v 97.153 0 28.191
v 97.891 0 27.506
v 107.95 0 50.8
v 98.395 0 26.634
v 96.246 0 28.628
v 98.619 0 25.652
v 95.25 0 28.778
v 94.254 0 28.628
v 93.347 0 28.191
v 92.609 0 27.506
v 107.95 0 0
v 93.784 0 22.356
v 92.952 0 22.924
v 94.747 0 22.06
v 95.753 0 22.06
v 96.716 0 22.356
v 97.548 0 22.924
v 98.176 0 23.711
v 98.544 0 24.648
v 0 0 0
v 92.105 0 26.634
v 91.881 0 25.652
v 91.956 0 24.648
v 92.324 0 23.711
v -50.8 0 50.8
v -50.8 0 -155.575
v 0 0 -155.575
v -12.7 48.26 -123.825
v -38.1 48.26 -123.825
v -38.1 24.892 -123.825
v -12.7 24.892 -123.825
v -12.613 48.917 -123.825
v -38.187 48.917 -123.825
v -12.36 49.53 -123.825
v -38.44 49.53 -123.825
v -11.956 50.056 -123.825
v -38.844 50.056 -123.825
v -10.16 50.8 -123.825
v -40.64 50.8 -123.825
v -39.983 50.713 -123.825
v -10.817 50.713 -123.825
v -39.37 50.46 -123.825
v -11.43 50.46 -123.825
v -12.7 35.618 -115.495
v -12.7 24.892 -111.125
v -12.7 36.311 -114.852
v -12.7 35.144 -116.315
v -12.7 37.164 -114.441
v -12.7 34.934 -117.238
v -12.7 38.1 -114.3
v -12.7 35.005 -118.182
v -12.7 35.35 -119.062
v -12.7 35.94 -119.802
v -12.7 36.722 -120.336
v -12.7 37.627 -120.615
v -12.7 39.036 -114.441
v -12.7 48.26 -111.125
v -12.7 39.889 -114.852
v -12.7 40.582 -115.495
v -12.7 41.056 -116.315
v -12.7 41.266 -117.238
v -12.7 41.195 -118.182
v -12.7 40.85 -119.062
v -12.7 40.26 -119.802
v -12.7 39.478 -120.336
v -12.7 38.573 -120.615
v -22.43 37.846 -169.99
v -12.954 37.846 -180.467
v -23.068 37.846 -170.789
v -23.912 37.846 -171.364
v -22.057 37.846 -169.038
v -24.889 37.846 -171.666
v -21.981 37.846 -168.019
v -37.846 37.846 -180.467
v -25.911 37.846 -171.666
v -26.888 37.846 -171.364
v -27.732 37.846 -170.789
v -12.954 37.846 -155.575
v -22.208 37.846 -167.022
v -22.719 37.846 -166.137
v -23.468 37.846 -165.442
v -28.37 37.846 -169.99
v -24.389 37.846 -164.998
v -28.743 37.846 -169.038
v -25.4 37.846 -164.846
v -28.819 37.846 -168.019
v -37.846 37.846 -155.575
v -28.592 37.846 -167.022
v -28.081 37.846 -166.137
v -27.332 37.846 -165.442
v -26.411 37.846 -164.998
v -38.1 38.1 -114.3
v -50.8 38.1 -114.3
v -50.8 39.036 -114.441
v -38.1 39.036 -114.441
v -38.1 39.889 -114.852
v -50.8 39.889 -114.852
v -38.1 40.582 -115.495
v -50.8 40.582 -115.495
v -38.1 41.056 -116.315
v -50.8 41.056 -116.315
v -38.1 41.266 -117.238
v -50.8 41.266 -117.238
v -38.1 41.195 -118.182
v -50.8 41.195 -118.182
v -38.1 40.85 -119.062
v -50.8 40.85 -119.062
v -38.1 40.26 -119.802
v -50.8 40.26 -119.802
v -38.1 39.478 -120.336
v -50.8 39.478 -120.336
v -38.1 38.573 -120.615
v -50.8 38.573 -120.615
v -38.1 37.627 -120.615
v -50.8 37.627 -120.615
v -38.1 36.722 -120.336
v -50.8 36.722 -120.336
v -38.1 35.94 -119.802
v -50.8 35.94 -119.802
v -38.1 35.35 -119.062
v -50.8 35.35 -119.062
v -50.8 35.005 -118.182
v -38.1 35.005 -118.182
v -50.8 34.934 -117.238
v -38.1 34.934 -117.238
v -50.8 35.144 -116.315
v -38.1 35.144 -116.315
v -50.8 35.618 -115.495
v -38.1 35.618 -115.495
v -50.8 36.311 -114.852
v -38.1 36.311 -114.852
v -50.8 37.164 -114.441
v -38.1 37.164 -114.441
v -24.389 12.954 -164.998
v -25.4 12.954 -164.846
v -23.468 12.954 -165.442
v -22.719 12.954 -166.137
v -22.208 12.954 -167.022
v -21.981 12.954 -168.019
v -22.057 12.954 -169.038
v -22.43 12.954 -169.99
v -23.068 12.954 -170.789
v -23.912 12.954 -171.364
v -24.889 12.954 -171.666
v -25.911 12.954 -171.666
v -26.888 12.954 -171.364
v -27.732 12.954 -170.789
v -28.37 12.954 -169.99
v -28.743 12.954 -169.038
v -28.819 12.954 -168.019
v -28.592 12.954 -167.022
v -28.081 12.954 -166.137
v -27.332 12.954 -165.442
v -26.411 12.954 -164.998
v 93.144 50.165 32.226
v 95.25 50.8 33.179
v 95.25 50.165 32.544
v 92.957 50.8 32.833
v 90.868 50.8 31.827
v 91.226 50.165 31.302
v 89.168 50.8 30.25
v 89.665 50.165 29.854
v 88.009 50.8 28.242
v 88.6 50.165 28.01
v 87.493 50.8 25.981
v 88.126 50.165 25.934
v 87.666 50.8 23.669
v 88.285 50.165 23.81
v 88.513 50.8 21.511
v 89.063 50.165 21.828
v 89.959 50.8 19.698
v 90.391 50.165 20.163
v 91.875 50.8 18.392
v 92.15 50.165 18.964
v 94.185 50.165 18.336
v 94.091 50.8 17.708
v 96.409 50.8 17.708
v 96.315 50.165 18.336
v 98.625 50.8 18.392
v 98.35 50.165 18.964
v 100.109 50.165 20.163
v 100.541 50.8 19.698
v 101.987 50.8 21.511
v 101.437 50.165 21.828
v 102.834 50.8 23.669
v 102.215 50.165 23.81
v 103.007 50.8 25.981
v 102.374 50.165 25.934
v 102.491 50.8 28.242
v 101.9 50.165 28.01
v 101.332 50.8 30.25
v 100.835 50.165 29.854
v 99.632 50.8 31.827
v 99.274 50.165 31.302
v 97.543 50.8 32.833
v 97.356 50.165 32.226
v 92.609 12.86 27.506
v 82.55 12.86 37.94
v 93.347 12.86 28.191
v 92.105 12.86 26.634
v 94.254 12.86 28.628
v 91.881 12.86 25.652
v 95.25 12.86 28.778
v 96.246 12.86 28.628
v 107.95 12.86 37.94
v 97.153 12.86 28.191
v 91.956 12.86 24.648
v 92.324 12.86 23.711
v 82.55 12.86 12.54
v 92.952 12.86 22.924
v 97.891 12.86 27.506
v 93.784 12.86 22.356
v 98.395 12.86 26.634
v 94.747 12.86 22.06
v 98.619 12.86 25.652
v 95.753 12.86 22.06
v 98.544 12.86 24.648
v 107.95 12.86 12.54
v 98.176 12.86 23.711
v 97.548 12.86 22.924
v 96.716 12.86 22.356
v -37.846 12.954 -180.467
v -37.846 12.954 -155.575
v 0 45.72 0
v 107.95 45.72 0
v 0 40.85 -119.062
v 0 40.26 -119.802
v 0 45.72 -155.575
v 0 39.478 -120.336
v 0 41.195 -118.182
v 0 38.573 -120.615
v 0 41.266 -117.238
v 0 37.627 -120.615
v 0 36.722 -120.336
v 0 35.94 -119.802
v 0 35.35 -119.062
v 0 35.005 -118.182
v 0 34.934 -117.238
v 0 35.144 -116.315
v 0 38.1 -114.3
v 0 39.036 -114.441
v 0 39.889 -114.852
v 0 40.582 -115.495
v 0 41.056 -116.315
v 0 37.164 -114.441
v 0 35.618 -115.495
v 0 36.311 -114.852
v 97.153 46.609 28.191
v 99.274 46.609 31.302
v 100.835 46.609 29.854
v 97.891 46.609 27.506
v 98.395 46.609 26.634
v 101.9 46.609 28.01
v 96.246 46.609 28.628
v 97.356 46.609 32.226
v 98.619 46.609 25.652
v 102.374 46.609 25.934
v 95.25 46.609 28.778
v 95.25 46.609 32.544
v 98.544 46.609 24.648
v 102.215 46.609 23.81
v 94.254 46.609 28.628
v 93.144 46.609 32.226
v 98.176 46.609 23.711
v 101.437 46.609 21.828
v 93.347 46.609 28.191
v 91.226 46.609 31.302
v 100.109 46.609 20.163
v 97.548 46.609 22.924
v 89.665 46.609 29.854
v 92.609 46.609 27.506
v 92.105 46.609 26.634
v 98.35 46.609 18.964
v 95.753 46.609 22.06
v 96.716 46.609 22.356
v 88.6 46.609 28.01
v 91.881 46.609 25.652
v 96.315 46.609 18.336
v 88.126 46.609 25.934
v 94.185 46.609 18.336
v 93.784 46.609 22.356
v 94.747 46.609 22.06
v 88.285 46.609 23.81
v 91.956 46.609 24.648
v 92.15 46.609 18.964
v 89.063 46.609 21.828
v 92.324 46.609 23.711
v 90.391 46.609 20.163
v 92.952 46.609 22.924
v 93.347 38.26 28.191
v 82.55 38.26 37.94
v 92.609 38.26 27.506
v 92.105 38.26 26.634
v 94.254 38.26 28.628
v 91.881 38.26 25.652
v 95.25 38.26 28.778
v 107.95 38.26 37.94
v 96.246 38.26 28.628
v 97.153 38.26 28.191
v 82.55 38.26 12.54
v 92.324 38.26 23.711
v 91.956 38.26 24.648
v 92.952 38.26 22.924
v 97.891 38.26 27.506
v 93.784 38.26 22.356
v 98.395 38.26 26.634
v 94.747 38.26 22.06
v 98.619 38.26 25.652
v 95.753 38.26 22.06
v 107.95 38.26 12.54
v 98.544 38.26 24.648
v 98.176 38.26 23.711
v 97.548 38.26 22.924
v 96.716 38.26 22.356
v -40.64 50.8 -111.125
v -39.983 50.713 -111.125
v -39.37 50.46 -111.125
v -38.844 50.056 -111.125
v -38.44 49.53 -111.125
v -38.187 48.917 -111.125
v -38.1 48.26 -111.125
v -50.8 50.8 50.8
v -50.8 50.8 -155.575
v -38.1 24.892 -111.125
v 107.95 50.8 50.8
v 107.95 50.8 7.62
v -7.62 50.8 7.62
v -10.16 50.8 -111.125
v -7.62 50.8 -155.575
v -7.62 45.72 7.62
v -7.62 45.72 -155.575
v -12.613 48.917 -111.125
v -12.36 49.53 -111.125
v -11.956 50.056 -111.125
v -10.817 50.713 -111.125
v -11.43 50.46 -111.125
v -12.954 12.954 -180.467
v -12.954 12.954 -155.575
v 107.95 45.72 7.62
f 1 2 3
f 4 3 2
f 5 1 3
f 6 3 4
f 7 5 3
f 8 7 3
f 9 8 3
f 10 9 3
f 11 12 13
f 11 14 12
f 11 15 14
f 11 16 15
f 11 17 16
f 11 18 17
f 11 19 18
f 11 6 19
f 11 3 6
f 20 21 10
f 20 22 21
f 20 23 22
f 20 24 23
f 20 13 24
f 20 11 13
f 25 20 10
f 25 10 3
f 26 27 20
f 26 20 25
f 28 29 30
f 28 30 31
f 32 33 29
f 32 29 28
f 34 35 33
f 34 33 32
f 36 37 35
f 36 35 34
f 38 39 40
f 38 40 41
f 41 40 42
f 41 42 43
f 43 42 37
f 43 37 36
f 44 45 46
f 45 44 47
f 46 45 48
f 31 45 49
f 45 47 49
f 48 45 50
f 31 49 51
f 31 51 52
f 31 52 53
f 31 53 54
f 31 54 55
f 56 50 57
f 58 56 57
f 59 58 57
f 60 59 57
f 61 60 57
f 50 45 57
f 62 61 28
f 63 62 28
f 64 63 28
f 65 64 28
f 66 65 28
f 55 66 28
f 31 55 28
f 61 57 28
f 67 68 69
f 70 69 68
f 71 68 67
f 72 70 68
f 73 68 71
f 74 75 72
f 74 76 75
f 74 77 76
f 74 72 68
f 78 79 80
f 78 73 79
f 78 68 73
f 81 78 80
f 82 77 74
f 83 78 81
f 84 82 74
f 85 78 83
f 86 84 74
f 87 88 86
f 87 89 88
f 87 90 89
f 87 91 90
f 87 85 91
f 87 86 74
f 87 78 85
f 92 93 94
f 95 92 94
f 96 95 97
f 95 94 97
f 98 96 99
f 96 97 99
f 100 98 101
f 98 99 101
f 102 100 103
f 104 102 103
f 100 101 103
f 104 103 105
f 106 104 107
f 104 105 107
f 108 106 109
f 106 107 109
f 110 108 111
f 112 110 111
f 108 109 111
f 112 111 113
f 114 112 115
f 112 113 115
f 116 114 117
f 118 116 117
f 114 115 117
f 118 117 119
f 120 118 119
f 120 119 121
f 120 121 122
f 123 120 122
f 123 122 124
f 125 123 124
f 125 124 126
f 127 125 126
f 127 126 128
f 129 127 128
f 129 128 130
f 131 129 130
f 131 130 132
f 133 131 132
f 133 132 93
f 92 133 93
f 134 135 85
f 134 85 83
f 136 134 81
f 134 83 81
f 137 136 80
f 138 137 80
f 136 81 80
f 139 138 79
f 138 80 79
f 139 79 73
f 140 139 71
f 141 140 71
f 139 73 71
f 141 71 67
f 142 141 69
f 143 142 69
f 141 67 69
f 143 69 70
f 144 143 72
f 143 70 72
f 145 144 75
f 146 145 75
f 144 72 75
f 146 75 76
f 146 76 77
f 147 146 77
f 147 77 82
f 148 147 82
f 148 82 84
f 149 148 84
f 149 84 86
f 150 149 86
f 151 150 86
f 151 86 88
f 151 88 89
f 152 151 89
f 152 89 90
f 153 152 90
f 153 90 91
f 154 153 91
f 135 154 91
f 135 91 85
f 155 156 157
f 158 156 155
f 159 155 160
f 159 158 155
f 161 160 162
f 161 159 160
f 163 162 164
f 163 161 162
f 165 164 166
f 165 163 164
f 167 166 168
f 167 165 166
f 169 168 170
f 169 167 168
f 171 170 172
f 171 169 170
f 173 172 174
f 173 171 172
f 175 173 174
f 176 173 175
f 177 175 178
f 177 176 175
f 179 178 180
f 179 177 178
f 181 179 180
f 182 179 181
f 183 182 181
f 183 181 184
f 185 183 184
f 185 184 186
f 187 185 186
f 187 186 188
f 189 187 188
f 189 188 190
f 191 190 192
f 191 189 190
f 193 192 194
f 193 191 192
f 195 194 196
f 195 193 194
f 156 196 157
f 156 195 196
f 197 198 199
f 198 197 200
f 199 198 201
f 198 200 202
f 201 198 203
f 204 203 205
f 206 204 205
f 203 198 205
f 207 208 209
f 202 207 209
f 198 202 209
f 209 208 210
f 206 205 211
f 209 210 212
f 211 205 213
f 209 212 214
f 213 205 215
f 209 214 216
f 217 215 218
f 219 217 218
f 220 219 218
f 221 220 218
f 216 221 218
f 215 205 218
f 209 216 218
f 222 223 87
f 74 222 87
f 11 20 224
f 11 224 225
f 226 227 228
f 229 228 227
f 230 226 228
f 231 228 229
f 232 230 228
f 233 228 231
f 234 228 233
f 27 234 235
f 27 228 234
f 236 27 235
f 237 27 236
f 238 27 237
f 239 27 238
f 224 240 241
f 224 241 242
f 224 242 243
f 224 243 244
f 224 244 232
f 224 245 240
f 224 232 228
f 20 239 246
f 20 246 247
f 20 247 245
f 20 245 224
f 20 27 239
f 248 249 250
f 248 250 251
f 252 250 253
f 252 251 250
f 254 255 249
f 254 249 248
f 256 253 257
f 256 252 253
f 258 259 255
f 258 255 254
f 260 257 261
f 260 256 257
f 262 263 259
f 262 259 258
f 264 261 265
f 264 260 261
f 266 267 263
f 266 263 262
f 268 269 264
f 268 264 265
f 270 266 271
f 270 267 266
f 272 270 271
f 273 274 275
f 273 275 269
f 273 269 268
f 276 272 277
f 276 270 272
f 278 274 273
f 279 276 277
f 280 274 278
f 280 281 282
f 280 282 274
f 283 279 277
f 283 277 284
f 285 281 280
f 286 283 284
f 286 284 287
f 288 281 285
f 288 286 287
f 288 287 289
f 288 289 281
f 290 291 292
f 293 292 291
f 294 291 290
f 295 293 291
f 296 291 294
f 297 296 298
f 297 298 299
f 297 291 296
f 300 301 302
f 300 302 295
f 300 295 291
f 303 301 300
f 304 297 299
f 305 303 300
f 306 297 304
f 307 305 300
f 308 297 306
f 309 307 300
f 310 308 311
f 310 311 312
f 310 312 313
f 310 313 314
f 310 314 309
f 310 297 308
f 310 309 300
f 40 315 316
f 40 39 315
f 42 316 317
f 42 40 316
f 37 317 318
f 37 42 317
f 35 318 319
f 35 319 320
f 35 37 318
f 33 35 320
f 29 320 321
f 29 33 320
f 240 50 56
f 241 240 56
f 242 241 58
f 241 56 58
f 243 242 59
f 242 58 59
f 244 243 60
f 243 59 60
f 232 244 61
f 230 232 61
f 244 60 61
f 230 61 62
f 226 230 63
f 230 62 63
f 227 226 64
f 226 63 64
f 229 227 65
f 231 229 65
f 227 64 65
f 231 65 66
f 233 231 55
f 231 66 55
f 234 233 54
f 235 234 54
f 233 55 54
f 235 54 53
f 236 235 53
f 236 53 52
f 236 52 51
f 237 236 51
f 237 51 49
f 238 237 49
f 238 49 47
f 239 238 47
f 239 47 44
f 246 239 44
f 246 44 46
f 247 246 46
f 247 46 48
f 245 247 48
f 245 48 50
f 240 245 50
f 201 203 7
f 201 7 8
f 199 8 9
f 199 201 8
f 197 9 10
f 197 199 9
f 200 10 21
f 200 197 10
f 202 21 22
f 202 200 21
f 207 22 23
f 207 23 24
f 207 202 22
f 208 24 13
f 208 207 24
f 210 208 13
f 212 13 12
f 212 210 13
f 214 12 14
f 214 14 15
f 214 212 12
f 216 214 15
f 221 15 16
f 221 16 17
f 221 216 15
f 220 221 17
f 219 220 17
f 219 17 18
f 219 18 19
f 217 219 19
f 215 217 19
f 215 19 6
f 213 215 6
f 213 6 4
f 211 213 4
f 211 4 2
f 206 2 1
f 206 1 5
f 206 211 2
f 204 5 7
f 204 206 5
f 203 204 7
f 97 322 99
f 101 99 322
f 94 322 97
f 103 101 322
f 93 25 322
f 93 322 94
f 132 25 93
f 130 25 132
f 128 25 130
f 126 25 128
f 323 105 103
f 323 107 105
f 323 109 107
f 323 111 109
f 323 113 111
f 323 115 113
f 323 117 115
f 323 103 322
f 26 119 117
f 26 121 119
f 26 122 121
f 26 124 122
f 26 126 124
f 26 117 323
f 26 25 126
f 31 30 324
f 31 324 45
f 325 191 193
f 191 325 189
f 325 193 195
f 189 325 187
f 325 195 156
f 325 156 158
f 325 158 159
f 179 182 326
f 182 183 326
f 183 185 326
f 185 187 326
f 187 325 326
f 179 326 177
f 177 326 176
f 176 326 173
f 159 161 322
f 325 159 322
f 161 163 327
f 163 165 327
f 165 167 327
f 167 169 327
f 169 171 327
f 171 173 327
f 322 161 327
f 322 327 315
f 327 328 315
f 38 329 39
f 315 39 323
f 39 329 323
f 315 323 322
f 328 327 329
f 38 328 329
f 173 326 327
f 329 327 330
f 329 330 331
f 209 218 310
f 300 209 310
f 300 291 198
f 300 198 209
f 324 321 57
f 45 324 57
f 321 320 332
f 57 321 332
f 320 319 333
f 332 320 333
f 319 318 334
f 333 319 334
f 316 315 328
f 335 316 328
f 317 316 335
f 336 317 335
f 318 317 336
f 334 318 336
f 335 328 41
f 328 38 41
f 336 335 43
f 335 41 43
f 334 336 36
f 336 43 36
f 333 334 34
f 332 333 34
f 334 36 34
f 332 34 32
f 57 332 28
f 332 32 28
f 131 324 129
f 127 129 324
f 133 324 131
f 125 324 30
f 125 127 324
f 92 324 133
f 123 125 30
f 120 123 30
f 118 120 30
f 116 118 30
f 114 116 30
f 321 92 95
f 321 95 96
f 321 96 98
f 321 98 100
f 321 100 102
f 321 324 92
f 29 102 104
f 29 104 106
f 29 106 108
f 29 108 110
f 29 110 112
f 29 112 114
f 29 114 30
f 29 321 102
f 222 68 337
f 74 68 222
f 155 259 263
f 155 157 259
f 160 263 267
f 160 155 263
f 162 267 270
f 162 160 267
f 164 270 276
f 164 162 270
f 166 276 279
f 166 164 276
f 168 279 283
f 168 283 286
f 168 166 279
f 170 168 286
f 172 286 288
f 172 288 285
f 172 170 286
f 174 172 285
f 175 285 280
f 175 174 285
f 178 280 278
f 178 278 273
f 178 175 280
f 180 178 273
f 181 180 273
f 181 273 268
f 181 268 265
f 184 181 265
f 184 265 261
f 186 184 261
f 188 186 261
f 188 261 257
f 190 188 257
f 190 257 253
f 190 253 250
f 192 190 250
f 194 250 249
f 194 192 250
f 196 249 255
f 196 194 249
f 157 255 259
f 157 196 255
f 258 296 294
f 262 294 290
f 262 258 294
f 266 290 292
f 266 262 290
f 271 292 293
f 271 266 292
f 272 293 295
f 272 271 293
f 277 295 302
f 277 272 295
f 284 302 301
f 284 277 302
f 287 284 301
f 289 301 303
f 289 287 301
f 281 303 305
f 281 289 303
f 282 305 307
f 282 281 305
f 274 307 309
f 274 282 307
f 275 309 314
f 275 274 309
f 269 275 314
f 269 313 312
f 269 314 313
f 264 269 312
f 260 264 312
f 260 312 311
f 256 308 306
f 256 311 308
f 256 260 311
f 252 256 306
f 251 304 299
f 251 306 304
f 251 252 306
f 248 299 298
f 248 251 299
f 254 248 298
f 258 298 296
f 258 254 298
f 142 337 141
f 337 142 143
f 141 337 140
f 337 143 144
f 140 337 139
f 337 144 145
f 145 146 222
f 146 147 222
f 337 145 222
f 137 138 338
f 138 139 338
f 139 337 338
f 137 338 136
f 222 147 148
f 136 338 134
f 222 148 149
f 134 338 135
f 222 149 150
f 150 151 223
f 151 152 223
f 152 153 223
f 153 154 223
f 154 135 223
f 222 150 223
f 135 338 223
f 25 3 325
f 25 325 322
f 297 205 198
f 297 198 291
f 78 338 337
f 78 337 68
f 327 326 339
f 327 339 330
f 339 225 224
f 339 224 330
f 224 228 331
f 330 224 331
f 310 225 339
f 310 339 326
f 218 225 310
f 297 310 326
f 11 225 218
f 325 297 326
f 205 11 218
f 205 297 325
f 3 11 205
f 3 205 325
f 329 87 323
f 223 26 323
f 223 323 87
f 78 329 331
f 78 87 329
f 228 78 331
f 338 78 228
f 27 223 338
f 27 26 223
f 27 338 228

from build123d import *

# Parameters (mm, degrees)
BOSS_EXTRUDE1_DEPTH = 50.8
SKETCH3_W           = 25.4
SKETCH3_H           = 25.4
CUT_EXTRUDE1_DEPTH  = 25.4
SKETCH8_W           = 24.892
SKETCH8_H           = 24.892
BOSS_EXTRUDE2_DEPTH = 24.892
SKETCH12_R          = 3.429
CUT_EXTRUDE2_DEPTH  = 25.4
SKETCH13_W          = 25.4
SKETCH13_H          = 12.7
CUT_EXTRUDE3_DEPTH  = 25.908
FILLET1_R           = 2.54
SKETCH14_R          = 3.175
CUT_EXTRUDE5_DEPTH  = 246.663470197
CUT_EXTRUDE6_DEPTH  = 5.08


with BuildPart() as part:
    # Sketch2 → Boss-Extrude1 (new body)
    with BuildSketch(Plane(origin=(0, 0, 0), x_dir=(1, 0, 0), z_dir=(0, 1, 0))):
        Polygon((-50.8, 155.575), (0, 155.575), (0, 0), (107.95, 0), (107.95, -50.8), (-50.8, -50.8), align=None)
    extrude(amount=BOSS_EXTRUDE1_DEPTH)

    # Sketch3 → Cut-Extrude1 (cut)
    with BuildSketch(Plane(origin=(107.95, 0, 0), x_dir=(0, 0, -1), z_dir=(1, 0, 0))):
        with Locations((-25.239912, 25.560088)):
            Rectangle(SKETCH3_W, SKETCH3_H)
    extrude(amount=-CUT_EXTRUDE1_DEPTH, mode=Mode.SUBTRACT)

    # Sketch7 → CBORE for 1/4 Binding Head Machine Screw1 (revolve, cut)
    with BuildSketch(Plane(origin=(95.25, 50.8, 25.4), x_dir=(0, 0, 1), z_dir=(1, 0, 0))):
        Polygon((0, 0), (0, 50.8), (3.3782, 50.8), (3.3782, 4.191), (7.14375, 4.191), (7.14375, 0.635), (7.77875, 0), align=None)
    revolve(axis=Axis((95.25, 57.15, 25.4), (0, -1, 0)), mode=Mode.SUBTRACT)

    # Sketch8 → Boss-Extrude2 (add)
    with BuildSketch(Plane(origin=(0, 0, -155.575), x_dir=(-1, 0, 0), z_dir=(0, 0, -1))):
        with Locations((25.4, 25.4)):
            Rectangle(SKETCH8_W, SKETCH8_H)
    extrude(amount=BOSS_EXTRUDE2_DEPTH)

    # Sketch12 → Cut-Extrude2 (cut)
    with BuildSketch(Plane(origin=(0, 37.846, 0), x_dir=(1, 0, 0), z_dir=(0, 1, 0))):
        with Locations(Location((-25.4, 168.275, 0), (0, 0, 270))):
            Circle(SKETCH12_R)
    extrude(amount=-CUT_EXTRUDE2_DEPTH, mode=Mode.SUBTRACT)

    # Sketch13 → Cut-Extrude3 (cut)
    with BuildSketch(Plane(origin=(0, 50.8, 0), x_dir=(1, 0, 0), z_dir=(0, 1, 0))):
        with Locations((-25.4, 117.475)):
            Rectangle(SKETCH13_W, SKETCH13_H)
    extrude(amount=-CUT_EXTRUDE3_DEPTH, mode=Mode.SUBTRACT)

    # Fillet1
    fillet1_edges = [part.edges().sort_by_distance(p)[0] for p in [
        (-38.1, 50.8, -117.475),
        (-12.7, 50.8, -117.475),
    ]]
    fillet(fillet1_edges, radius=FILLET1_R)

    # Sketch14 → Cut-Extrude5 (cut, through all)
    with BuildSketch(Plane.ZY.offset(50.8)):
        with Locations((-117.475, 38.1)):
            Circle(SKETCH14_R)
    extrude(amount=-CUT_EXTRUDE5_DEPTH, mode=Mode.SUBTRACT)

    # Sketch17 → Cut-Extrude6 (cut)
    with BuildSketch(Plane(origin=(0, 50.8, 0), x_dir=(1, 0, 0), z_dir=(0, 1, 0))):
        Polygon((0, 155.575), (0, 0), (107.95, 0), (107.95, -7.62), (-7.62, -7.62), (-7.62, 155.575), align=None)
    extrude(amount=-CUT_EXTRUDE6_DEPTH, mode=Mode.SUBTRACT)


solid = part.part
